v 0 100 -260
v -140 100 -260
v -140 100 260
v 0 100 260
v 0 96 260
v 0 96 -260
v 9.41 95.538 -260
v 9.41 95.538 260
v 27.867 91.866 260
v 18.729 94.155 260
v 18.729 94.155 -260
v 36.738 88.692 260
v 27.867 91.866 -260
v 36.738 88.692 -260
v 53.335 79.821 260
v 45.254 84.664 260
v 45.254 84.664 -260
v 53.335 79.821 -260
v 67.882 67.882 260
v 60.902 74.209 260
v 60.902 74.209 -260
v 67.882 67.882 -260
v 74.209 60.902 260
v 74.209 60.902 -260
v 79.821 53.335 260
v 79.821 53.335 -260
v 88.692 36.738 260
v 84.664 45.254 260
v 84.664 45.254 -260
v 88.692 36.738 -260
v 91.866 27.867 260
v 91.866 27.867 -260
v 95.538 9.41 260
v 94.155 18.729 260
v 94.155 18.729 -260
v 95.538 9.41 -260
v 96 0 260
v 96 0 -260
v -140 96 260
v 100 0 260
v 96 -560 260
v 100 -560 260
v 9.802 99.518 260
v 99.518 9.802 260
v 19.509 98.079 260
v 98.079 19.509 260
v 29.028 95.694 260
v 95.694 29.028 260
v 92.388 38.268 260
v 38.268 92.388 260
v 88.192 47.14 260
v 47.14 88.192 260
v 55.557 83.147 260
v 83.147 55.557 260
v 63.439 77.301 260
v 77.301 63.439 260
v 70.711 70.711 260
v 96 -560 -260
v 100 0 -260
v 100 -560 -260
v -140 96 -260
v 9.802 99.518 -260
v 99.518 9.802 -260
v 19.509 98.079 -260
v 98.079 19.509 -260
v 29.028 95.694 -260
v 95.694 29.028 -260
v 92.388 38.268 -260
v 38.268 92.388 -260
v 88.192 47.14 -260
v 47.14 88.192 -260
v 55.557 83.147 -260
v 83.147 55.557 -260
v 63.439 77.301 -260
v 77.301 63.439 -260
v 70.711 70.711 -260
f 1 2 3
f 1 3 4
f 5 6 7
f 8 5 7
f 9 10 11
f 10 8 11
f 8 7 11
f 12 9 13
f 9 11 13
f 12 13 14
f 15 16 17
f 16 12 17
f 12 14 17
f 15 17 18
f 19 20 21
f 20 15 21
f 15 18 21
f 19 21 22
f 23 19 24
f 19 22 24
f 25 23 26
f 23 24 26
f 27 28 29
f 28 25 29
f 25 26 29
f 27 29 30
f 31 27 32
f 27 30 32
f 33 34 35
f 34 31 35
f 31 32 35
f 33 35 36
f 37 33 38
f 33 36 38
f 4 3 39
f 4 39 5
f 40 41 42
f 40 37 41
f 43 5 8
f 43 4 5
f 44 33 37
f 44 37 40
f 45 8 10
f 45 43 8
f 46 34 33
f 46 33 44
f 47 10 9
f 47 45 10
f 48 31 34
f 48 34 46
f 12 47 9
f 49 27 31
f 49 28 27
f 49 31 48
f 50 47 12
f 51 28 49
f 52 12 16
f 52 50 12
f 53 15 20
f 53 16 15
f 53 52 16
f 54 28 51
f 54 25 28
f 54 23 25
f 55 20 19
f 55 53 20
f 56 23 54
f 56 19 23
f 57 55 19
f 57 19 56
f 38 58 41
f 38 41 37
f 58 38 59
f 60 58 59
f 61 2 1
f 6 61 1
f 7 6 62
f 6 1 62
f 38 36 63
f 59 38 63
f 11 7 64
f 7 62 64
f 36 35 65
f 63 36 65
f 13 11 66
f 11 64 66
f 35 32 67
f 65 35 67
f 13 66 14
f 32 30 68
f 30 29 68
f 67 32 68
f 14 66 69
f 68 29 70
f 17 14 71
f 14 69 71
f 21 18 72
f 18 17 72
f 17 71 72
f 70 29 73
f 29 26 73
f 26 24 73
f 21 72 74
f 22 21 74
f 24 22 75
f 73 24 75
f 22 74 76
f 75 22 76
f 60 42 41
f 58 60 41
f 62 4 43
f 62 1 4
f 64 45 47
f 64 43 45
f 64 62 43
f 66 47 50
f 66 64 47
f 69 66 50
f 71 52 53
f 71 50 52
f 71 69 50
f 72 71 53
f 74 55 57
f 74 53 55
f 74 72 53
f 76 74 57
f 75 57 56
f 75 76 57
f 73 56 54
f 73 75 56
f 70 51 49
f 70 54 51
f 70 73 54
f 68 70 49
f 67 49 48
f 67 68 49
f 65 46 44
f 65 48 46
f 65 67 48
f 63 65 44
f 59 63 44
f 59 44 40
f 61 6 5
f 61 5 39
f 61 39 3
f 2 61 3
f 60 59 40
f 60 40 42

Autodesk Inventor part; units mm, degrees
ref_plane "YZ Plane" through (0, 0, 0) normal (1, 0, 0) x (0, 1, 0)
ref_plane "XZ Plane" through (0, 0, 0) normal (0, 1, 0) x (-1, 0, 0)
ref_plane "XY Plane" through (0, 0, 0) normal (0, 0, 1) x (1, 0, 0)
sketch "Sketch1" plane through (0, 0, 0) normal (0, 0, 1) x (1, 0, 0)
  line L0 (-140, 100) -> (0, 100)
  arc A0 (100, 0) -> (0, 100) centre (0, 0) ccw
  line L1 (100, 0) -> (100, -560)
  line L2 (100, -560) -> (96, -560)
  line L3 (96, -560) -> (96, 0)
  arc A1 (96, 0) -> (0, 96) centre (0, 0) ccw
  line L4 (0, 96) -> (-140, 96)
  line L5 (-140, 96) -> (-140, 100)
  dimension "d0" = 4
  dimension "d1" = 660
  dimension "d2" = 240
  dimension "d3" = 100
extrude "Extrusion1" add sketch "Sketch1" along normal mid plane 520
properties part number "RT_FRM_MC_012_Electrical_housing_door" material "Polycarbonate, Clear"
